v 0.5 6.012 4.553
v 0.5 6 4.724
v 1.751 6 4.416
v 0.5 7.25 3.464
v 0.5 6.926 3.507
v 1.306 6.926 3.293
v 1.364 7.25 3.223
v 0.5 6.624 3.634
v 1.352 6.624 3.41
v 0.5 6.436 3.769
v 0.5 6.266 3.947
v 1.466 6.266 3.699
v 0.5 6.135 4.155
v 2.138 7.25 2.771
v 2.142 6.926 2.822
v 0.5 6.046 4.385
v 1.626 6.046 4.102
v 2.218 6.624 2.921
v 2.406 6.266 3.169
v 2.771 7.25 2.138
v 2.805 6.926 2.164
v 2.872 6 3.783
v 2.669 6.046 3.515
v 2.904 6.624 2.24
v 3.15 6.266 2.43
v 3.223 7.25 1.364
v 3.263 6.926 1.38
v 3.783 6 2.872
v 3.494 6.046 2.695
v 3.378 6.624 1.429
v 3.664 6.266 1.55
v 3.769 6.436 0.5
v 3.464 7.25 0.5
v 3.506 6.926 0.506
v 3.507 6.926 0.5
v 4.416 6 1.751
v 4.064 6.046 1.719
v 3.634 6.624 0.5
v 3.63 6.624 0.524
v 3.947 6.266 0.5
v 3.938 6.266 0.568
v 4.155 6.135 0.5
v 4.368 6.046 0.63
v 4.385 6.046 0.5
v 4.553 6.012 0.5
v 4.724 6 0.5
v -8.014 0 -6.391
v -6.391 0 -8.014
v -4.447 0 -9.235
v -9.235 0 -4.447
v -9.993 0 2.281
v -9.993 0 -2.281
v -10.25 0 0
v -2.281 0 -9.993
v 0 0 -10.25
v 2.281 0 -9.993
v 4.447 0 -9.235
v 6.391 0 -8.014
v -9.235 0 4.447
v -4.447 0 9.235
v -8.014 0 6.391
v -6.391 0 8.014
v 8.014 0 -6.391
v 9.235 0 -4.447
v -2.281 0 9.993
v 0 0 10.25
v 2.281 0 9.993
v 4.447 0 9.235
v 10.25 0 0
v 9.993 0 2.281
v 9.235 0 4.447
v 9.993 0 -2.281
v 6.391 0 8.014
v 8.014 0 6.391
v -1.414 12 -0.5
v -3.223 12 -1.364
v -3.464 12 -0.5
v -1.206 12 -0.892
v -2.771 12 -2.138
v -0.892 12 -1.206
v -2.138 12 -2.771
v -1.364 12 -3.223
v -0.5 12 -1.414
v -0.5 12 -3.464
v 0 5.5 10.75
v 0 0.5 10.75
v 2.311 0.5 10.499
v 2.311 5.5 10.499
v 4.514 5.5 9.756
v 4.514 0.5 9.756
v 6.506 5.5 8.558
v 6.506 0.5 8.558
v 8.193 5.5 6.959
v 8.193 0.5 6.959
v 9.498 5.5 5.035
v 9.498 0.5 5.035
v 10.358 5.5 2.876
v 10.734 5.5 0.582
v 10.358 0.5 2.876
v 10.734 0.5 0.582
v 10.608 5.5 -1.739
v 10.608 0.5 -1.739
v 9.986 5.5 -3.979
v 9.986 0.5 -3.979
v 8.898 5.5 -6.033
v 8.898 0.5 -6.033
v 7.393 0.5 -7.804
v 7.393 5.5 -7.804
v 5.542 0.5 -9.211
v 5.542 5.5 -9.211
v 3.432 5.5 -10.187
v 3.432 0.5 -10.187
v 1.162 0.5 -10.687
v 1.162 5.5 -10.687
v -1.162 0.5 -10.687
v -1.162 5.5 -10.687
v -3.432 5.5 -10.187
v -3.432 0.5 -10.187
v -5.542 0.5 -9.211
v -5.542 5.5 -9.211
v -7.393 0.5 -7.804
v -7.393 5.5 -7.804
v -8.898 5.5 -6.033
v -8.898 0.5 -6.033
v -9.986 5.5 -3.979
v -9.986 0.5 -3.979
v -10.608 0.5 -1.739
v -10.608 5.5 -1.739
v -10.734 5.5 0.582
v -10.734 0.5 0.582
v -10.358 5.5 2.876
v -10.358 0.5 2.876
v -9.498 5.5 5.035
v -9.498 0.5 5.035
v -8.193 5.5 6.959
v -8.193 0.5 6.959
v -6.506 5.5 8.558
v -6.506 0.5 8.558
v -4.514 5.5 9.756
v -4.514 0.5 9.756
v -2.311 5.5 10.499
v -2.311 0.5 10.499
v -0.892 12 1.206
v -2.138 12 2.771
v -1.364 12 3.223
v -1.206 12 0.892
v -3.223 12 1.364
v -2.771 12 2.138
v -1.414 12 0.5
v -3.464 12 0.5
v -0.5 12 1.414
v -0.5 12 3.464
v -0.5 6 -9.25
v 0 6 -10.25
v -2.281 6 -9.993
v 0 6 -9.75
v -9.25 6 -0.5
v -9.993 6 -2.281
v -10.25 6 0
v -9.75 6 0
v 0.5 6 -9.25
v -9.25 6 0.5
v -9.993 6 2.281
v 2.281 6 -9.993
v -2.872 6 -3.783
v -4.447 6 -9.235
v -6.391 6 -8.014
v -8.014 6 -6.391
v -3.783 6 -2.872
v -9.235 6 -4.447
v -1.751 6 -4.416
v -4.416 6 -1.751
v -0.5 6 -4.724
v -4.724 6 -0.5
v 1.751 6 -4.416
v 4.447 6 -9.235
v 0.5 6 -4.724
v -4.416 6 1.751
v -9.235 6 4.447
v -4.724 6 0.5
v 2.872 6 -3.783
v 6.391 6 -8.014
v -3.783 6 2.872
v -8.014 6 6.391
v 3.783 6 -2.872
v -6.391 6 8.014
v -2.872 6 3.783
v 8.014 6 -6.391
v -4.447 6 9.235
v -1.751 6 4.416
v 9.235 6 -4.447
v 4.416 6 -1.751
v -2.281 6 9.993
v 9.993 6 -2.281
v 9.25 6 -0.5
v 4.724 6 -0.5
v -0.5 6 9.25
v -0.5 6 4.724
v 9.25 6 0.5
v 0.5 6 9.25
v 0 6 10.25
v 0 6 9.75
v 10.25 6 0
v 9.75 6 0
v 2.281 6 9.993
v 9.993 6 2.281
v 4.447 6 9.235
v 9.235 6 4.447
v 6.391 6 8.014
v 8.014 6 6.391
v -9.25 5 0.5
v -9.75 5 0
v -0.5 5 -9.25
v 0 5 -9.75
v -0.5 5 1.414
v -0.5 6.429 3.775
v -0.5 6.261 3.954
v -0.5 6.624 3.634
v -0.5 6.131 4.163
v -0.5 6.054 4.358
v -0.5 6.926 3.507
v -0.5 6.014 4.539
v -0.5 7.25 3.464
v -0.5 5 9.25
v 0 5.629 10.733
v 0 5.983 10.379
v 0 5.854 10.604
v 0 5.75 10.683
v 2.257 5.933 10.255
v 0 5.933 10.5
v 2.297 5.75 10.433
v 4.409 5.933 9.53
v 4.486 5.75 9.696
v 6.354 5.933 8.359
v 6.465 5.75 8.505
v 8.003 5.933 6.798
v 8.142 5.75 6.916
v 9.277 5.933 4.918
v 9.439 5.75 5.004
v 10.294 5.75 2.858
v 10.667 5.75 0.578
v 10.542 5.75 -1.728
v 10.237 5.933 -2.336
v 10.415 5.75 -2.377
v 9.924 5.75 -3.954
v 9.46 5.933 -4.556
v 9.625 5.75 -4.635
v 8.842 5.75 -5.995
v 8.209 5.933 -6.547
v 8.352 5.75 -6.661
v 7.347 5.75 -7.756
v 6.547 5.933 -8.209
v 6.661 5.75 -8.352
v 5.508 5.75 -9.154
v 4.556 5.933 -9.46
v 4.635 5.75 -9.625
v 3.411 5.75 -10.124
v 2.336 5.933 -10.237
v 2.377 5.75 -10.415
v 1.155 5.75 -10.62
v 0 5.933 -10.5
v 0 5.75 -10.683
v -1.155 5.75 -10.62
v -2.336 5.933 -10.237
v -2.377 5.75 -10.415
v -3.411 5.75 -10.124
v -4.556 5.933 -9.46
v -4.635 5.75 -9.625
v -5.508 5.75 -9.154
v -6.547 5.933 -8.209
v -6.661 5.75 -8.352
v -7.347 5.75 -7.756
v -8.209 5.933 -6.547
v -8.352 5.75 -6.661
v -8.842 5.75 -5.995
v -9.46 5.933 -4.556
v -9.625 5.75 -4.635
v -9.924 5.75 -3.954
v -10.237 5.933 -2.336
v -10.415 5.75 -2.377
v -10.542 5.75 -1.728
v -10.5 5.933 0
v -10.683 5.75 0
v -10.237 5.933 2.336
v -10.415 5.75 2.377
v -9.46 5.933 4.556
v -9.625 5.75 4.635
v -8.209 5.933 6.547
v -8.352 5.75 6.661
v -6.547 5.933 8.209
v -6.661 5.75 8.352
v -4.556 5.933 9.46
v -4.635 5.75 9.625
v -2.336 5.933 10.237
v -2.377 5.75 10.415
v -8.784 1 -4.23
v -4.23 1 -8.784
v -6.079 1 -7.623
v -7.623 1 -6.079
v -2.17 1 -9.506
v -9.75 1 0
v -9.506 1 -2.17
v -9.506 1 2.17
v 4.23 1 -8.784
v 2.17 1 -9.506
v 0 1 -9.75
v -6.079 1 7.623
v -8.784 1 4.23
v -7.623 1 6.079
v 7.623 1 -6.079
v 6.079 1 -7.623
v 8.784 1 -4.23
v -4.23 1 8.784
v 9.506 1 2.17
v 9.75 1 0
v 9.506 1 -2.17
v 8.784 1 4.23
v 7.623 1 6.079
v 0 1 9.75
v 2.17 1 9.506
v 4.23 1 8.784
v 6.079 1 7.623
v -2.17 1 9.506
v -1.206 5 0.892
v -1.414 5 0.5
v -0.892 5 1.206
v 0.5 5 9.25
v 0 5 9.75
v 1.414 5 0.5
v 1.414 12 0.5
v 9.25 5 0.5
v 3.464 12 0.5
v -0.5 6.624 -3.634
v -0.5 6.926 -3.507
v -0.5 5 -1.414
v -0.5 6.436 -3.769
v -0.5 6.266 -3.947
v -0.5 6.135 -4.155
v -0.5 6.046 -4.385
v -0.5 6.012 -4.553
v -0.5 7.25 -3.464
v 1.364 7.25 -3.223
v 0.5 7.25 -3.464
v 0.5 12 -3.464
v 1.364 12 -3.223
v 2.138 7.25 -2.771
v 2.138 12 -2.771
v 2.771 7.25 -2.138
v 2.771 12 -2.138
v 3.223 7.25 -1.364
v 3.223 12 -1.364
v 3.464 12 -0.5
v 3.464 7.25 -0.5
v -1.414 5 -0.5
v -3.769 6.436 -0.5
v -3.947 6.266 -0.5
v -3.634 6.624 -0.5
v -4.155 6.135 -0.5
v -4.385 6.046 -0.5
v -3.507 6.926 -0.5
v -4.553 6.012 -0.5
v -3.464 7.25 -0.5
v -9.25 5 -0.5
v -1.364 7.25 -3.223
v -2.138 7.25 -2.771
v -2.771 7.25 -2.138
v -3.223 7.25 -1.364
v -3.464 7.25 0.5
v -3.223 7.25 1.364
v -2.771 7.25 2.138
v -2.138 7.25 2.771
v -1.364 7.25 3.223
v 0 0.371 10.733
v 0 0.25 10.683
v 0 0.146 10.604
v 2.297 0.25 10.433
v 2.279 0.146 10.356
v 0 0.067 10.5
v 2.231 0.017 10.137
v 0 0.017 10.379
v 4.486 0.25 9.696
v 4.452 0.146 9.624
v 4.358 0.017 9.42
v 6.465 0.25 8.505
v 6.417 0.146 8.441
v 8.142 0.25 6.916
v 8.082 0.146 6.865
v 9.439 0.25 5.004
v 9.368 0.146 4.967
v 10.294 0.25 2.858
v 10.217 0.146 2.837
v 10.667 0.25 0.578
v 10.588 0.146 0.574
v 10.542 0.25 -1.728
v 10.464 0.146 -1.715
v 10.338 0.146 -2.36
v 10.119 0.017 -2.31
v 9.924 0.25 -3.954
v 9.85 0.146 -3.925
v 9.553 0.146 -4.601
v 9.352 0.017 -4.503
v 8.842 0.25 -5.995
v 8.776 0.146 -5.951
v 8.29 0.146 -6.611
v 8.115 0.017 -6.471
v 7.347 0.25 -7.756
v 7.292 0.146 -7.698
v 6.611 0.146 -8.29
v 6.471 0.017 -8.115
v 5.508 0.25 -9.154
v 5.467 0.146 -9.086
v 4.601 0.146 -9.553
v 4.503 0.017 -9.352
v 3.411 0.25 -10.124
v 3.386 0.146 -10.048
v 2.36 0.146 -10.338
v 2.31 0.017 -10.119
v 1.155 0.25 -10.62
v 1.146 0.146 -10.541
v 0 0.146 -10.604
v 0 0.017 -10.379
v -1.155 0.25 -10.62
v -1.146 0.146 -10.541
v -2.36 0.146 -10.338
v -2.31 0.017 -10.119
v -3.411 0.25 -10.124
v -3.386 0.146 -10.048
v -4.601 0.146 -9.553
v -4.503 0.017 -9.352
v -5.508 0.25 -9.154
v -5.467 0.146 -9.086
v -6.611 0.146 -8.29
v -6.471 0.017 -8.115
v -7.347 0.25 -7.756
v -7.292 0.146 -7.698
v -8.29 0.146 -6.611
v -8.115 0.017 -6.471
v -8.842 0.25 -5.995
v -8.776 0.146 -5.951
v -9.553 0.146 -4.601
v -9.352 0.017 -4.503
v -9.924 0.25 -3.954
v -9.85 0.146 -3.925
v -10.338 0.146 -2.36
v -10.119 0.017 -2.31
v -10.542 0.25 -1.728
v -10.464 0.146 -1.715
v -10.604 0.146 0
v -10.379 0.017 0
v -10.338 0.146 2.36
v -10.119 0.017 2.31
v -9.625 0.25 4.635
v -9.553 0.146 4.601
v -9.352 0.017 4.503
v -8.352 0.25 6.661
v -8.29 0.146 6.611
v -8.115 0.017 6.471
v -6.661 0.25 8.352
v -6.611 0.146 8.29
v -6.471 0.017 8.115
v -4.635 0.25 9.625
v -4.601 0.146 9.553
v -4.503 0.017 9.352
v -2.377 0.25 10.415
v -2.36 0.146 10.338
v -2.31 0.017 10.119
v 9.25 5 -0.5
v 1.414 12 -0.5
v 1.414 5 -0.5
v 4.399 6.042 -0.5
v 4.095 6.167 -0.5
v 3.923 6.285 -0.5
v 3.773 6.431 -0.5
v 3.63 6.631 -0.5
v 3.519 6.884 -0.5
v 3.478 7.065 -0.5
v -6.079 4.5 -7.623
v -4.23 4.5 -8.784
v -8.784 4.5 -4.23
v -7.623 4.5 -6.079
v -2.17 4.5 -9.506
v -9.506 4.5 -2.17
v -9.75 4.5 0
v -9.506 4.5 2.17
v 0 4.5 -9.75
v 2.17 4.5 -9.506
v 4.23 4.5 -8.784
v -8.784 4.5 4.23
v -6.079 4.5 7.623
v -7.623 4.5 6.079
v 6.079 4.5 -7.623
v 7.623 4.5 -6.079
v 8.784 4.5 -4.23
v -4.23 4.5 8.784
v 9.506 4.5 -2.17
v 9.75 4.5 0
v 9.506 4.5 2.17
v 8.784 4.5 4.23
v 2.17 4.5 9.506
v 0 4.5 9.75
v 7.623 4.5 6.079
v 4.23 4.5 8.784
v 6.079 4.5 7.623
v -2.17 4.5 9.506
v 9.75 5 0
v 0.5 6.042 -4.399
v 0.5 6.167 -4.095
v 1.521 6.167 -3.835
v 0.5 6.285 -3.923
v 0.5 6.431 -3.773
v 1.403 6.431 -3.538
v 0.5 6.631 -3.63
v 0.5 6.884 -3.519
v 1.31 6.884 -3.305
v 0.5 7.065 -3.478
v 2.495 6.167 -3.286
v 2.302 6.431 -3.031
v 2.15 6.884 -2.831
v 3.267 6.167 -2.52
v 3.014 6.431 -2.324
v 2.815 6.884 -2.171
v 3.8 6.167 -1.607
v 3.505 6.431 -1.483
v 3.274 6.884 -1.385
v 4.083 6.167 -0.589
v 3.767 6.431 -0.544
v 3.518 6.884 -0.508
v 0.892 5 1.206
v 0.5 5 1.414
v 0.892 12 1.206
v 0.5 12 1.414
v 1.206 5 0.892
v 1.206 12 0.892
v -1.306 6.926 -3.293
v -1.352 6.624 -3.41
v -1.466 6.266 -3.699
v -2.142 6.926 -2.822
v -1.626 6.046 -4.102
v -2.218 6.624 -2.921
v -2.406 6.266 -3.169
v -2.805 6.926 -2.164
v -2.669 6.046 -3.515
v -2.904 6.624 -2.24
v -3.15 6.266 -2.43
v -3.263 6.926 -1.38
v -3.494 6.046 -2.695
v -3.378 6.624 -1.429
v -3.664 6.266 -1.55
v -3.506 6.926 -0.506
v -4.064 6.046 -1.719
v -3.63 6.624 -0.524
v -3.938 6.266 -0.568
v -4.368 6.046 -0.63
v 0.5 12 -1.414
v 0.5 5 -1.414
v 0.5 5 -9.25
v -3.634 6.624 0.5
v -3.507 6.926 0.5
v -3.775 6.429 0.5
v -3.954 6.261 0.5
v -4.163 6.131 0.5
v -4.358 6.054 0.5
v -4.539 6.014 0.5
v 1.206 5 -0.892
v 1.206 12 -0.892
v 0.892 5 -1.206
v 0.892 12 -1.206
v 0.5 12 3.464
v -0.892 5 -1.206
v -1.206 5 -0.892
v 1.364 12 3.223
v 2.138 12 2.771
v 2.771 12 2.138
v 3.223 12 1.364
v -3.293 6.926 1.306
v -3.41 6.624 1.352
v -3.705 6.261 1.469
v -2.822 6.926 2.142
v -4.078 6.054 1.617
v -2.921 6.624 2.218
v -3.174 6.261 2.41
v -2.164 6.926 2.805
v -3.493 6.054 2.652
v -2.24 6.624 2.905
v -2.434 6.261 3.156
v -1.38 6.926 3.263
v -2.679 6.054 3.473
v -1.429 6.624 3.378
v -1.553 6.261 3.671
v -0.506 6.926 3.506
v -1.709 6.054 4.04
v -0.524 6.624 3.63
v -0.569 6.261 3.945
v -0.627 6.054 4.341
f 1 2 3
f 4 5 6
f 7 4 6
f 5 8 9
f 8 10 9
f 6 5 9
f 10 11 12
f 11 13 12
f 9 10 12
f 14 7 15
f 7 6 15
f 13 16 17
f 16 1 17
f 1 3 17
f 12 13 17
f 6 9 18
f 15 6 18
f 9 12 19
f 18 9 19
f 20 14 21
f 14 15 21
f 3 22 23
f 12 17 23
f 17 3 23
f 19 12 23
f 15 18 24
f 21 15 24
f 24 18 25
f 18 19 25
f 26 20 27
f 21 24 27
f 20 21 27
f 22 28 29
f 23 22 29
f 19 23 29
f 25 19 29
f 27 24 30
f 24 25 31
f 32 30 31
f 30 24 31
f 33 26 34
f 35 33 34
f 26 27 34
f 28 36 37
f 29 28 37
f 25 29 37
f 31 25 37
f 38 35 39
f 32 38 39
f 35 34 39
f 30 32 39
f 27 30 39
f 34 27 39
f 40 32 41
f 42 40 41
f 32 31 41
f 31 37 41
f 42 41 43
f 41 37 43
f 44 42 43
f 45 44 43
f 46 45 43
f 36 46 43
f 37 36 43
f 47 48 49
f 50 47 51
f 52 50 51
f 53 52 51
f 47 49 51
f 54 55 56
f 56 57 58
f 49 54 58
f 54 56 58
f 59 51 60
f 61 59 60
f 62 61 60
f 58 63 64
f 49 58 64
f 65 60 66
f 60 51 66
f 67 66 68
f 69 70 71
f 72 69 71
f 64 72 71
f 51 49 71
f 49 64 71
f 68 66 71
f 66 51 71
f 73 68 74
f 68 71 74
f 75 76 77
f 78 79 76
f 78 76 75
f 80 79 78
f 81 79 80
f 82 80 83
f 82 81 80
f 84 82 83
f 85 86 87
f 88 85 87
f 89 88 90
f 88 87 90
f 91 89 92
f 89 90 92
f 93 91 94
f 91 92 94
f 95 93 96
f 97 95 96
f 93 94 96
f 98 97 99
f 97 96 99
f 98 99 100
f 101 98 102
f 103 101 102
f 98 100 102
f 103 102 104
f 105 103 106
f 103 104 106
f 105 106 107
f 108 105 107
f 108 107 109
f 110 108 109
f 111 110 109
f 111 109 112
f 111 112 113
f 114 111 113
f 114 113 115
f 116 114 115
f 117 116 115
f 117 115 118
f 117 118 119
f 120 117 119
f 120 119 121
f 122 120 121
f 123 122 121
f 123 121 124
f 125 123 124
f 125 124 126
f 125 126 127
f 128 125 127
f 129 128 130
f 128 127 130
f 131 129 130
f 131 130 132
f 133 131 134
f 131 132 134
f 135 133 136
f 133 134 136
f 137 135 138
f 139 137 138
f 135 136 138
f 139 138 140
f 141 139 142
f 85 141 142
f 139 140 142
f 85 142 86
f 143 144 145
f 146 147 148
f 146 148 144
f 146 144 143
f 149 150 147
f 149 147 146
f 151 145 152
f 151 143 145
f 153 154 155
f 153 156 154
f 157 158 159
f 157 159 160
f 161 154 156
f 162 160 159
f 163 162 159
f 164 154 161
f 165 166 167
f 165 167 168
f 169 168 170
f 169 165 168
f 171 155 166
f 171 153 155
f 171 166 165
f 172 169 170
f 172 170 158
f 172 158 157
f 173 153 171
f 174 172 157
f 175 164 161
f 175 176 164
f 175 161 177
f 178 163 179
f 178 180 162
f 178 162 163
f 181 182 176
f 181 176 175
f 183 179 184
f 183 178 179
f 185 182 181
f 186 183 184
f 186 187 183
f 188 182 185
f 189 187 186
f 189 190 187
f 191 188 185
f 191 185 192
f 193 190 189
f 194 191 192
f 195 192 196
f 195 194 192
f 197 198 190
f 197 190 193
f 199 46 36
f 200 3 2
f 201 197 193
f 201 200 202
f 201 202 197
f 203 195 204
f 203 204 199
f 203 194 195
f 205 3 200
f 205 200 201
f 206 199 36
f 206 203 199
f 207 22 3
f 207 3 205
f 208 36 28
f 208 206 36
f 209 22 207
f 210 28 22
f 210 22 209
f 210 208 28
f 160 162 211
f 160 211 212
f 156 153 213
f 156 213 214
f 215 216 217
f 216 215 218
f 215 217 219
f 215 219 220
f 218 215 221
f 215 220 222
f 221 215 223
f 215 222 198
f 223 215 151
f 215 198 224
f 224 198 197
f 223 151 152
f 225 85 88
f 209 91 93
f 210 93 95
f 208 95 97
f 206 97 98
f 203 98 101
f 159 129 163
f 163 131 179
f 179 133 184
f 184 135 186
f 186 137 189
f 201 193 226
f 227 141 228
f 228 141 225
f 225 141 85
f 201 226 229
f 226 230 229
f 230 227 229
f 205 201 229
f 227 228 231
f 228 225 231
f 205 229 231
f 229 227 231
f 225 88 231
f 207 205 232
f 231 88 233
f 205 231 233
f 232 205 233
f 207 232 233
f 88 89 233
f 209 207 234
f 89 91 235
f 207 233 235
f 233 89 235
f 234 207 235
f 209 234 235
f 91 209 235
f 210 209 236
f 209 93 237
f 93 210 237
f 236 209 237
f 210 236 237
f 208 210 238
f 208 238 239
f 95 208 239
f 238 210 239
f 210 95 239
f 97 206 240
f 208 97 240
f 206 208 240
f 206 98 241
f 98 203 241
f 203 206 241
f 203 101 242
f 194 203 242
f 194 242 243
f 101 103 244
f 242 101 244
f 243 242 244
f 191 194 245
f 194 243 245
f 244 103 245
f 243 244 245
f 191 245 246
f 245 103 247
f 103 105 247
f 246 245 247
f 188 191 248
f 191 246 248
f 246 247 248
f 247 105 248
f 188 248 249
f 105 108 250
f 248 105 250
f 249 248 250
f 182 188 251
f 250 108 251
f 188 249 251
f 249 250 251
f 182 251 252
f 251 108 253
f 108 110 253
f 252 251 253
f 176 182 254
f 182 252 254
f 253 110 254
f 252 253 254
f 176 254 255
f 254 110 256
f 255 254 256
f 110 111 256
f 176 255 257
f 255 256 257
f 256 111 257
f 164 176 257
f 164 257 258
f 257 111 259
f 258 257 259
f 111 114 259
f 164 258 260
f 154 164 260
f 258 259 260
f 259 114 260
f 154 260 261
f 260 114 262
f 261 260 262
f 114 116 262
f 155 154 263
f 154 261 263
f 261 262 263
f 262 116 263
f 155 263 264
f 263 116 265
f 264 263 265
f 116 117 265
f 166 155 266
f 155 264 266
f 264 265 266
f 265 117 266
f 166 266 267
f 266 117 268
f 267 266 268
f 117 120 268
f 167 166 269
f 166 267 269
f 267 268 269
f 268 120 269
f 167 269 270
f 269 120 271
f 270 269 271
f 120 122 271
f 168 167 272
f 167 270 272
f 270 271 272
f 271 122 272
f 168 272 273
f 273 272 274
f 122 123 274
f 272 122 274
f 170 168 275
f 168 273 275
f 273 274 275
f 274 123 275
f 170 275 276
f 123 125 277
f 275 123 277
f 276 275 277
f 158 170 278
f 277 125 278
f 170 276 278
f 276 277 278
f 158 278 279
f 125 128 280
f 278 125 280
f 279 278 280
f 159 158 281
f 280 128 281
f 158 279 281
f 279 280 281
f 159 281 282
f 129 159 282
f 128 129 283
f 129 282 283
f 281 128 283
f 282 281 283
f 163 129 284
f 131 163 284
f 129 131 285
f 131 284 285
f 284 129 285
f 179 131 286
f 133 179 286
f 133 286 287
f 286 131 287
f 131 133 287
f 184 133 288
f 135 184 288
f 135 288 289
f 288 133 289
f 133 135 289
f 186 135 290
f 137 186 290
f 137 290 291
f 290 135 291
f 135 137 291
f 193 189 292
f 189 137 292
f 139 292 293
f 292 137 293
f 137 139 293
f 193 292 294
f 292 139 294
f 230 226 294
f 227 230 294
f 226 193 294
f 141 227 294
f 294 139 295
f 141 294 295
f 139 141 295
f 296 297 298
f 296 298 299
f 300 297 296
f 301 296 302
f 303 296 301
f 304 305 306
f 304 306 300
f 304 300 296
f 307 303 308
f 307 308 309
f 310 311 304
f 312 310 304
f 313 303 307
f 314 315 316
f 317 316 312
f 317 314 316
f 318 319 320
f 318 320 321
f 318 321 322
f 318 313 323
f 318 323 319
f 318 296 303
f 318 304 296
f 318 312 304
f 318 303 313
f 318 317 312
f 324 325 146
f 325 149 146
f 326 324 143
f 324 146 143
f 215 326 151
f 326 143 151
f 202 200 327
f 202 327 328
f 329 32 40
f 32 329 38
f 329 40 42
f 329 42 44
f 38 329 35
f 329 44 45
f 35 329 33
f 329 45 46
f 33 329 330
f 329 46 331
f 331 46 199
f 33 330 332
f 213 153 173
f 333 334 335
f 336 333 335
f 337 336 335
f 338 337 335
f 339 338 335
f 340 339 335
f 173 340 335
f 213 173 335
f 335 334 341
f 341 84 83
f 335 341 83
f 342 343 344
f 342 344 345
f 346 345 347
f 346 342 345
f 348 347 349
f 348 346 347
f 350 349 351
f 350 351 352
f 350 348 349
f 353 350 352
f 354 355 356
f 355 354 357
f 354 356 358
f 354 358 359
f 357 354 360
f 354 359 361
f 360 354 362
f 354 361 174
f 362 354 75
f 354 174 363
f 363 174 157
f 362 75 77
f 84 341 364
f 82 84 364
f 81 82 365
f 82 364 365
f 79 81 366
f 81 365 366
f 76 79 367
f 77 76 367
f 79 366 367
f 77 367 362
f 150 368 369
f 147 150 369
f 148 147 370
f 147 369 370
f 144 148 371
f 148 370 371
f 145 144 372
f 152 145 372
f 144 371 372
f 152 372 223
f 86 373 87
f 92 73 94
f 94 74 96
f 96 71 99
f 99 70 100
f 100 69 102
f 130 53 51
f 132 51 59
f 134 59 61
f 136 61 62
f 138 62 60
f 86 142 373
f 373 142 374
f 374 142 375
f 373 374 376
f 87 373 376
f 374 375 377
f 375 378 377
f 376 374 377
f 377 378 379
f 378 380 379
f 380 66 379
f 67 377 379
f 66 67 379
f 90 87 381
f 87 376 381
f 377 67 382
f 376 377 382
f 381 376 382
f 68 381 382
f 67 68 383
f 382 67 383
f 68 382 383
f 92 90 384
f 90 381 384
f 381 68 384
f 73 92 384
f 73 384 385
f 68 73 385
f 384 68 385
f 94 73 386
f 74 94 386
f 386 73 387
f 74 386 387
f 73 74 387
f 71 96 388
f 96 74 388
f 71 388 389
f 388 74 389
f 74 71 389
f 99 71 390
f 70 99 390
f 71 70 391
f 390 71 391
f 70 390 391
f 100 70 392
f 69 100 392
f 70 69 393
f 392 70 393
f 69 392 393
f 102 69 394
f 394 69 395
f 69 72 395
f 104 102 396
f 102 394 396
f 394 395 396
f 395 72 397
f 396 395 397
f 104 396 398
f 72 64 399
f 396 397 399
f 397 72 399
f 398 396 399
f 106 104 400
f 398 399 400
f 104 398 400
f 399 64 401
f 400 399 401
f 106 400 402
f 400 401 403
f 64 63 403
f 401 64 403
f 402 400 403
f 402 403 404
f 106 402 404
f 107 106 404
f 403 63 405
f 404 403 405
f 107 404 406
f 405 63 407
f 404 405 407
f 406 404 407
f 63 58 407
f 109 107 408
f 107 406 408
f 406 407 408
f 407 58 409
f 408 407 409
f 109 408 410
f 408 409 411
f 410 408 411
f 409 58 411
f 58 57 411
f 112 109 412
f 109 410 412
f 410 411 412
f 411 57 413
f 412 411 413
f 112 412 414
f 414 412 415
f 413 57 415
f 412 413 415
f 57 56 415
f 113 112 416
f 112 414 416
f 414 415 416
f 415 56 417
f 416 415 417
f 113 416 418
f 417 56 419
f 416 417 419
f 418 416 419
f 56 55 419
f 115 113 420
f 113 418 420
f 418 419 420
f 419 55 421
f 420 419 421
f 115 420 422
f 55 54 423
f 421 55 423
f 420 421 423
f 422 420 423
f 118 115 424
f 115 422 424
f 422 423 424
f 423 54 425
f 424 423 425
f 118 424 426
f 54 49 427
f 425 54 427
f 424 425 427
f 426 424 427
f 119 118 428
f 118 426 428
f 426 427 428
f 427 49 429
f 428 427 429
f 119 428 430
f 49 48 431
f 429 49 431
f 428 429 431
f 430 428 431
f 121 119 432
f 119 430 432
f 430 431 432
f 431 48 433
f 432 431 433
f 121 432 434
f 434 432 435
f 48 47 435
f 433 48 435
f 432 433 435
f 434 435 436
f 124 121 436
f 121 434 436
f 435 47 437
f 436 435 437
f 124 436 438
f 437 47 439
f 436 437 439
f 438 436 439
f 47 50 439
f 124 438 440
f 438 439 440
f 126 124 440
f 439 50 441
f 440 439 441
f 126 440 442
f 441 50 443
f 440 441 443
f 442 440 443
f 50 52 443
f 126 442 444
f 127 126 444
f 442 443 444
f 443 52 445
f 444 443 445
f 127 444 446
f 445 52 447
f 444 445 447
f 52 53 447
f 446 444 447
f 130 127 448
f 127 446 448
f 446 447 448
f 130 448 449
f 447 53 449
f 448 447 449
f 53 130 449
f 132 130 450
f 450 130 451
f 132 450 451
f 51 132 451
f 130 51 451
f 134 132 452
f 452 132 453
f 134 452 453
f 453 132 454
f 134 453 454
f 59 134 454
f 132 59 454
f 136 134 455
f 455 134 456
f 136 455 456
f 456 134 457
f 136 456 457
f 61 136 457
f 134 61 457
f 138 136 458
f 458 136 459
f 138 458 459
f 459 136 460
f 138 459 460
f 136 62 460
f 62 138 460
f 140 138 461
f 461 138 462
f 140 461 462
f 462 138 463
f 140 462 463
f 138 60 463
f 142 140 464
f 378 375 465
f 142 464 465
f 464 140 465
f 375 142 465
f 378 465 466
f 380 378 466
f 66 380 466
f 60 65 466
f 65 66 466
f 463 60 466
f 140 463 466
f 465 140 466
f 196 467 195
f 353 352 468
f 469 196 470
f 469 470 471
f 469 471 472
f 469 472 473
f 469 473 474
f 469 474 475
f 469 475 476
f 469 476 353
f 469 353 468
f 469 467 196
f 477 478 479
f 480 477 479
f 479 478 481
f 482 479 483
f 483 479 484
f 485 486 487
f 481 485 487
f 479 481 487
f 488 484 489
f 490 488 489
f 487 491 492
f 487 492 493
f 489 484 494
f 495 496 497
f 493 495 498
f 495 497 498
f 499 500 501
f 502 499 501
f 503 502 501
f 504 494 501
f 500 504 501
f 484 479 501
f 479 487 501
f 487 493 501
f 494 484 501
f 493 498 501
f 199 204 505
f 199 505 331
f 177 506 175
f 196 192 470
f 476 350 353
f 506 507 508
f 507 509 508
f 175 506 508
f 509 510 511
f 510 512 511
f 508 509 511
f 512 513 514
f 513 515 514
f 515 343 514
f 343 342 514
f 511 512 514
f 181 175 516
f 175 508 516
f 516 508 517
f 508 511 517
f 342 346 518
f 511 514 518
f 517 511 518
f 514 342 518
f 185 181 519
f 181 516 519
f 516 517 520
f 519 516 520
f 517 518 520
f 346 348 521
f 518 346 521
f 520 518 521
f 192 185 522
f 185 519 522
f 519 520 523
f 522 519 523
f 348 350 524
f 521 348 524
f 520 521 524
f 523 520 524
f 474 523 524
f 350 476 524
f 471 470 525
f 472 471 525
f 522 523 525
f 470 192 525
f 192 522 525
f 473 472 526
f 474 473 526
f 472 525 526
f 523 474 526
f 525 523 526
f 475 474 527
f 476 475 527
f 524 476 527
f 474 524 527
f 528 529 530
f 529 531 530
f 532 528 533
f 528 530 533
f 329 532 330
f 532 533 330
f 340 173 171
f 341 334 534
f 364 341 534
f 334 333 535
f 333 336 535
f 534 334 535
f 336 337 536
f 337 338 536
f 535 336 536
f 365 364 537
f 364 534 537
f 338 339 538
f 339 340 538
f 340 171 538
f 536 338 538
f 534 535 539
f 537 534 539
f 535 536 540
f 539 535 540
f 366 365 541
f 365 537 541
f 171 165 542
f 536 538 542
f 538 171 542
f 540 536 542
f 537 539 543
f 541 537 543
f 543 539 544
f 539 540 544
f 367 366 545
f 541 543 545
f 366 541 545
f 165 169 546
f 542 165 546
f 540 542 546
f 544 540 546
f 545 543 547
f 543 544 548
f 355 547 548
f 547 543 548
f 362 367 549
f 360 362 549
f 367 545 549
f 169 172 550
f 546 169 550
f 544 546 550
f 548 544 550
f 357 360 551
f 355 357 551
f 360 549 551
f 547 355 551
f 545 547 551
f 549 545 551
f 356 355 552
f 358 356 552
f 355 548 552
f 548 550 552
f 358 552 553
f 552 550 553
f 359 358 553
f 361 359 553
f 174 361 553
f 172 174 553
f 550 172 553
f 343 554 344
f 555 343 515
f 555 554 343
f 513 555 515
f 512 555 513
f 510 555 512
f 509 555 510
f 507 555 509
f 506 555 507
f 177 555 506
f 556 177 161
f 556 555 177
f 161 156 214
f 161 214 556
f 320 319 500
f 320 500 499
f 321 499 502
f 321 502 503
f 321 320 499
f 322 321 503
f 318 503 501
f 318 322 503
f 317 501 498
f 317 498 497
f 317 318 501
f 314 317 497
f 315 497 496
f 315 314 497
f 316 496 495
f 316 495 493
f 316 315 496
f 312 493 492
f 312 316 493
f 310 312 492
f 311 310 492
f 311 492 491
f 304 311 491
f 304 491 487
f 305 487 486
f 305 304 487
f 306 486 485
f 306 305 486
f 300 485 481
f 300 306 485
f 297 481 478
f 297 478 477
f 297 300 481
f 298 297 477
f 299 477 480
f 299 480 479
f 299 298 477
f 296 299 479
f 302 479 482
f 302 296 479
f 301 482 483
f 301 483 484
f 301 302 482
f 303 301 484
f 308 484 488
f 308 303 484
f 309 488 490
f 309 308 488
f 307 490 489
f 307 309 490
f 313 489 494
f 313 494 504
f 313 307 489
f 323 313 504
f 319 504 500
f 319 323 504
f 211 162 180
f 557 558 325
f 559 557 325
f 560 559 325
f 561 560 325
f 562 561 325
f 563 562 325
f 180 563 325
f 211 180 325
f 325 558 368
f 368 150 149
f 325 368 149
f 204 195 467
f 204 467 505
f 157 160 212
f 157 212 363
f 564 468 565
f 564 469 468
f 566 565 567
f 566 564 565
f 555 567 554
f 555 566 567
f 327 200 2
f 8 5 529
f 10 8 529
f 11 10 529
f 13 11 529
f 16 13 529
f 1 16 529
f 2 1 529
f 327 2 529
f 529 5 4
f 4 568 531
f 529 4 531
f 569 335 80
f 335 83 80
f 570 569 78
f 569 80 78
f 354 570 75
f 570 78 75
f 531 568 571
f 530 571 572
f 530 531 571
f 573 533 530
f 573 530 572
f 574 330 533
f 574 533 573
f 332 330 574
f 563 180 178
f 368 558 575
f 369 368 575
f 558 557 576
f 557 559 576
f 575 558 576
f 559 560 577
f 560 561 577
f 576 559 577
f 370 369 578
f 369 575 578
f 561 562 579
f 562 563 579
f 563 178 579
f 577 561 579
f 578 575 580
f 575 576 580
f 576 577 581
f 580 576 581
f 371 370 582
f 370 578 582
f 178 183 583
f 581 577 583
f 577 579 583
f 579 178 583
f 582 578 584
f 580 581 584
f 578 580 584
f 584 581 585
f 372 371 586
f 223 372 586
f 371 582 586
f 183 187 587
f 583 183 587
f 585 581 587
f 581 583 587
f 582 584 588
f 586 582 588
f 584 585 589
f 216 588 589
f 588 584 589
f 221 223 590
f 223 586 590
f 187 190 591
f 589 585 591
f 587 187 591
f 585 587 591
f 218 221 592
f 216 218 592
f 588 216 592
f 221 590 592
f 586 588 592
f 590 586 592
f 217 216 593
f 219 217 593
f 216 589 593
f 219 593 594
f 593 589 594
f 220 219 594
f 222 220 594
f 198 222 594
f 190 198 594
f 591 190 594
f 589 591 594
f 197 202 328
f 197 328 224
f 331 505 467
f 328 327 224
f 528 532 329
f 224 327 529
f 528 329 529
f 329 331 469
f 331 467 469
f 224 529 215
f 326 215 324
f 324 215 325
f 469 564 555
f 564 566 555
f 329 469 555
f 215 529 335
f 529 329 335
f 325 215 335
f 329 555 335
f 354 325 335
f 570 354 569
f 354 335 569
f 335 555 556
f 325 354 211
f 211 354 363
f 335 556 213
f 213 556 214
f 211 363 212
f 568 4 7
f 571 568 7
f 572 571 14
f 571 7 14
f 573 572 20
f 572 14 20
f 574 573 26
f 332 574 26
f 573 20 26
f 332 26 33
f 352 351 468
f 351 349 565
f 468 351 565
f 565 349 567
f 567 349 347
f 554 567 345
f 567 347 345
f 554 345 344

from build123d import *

# Parameters (mm, degrees)
SKETCH1_R           = 10.75
SKETCH1_R_2         = 9.75
BOSS_EXTRUDE1_DEPTH = 1
SKETCH2_R           = 10.75
SKETCH2_R_2         = 9.75
BOSS_EXTRUDE2_DEPTH = 3.5
SKETCH3_R           = 10.75
BOSS_EXTRUDE3_DEPTH = 1.5
CUT_EXTRUDE1_DEPTH  = 1
BOSS_EXTRUDE4_DEPTH = 6
FILLET1_R           = 1.25
FILLET2_R           = 0.5


with BuildPart() as part:
    # Sketch1 → Boss-Extrude1 (new body)
    with BuildSketch(Plane(origin=(0, 0, 0), x_dir=(1, 0, 0), z_dir=(0, 1, 0))):
        with Locations(Location((0, 0, 0), (0, 0, 270))):
            Circle(SKETCH1_R)
        Circle(SKETCH1_R_2, mode=Mode.SUBTRACT)
        Circle(SKETCH1_R_2)
    extrude(amount=BOSS_EXTRUDE1_DEPTH)

    # Sketch2 → Boss-Extrude2 (add)
    with BuildSketch(Plane(origin=(0, 1, 0), x_dir=(1, 0, 0), z_dir=(0, 1, 0))):
        with Locations(Location((0, 0, 0), (0, 0, 270))):
            Circle(SKETCH2_R)
        with Locations(Location((0, 0, 0), (0, 0, 270))):
            Circle(SKETCH2_R_2, mode=Mode.SUBTRACT)
    extrude(amount=BOSS_EXTRUDE2_DEPTH)

    # Sketch3 → Boss-Extrude3 (add)
    with BuildSketch(Plane(origin=(0, 4.5, 0), x_dir=(1, 0, 0), z_dir=(0, 1, 0))):
        with Locations(Location((0, 0, 0), (0, 0, 270))):
            Circle(SKETCH3_R)
    extrude(amount=BOSS_EXTRUDE3_DEPTH)

    # Sketch4 → Cut-Extrude1 (cut)
    with BuildSketch(Plane(origin=(0, 6, 0), x_dir=(1, 0, 0), z_dir=(0, 1, 0))):
        Polygon((-9.25, -0.5), (-9.75, 0), (-9.25, 0.5), (-0.5, 0.5), (-0.5, 9.25), (0, 9.75), (0.5, 9.25), (0.5, 0.5), (9.25, 0.5), (9.75, 0), (9.25, -0.5), (0.5, -0.5), (0.5, -9.25), (0, -9.75), (-0.5, -9.25), (-0.5, -0.5), align=None)
        with BuildLine():
            ThreePointArc((-1.414213562, -0.5), (-1.5, 0), (-1.414213562, 0.5))
            Line((-1.414213562, 0.5), (-9.25, 0.5))
            Line((-9.25, 0.5), (-9.75, 0))
            Line((-9.75, 0), (-9.25, -0.5))
            Line((-9.25, -0.5), (-1.414213562, -0.5))
        make_face()
        with BuildLine():
            Line((9.25, 0.5), (1.414213562, 0.5))
            ThreePointArc((1.414213562, 0.5), (1.478397839, 0.253652968), (1.5, 0))
            ThreePointArc((1.5, 0), (1.478397839, -0.253652968), (1.414213562, -0.5))
            Line((1.414213562, -0.5), (9.25, -0.5))
            Line((9.25, -0.5), (9.75, 0))
            Line((9.75, 0), (9.25, 0.5))
        make_face()
        with BuildLine():
            Line((-0.5, 9.25), (-0.5, 1.414213562))
            ThreePointArc((-0.5, 1.414213562), (0, 1.5), (0.5, 1.414213562))
            Line((0.5, 1.414213562), (0.5, 9.25))
            Line((0.5, 9.25), (0, 9.75))
            Line((0, 9.75), (-0.5, 9.25))
        make_face()
        with BuildLine():
            ThreePointArc((0.5, -1.414213562), (0, -1.5), (-0.5, -1.414213562))
            Line((-0.5, -1.414213562), (-0.5, -9.25))
            Line((-0.5, -9.25), (0, -9.75))
            Line((0, -9.75), (0.5, -9.25))
            Line((0.5, -9.25), (0.5, -1.414213562))
        make_face()
        with BuildLine():
            Line((-0.5, -0.5), (-1.414213562, -0.5))
            ThreePointArc((-1.414213562, -0.5), (-1.060660172, -1.060660172), (-0.5, -1.414213562))
            Line((-0.5, -1.414213562), (-0.5, -0.5))
        make_face()
        with BuildLine():
            Line((-1.414213562, 0.5), (-0.5, 0.5))
            Line((-0.5, 0.5), (-0.5, 1.414213562))
            ThreePointArc((-0.5, 1.414213562), (-1.060660172, 1.060660172), (-1.414213562, 0.5))
        make_face()
        with BuildLine():
            ThreePointArc((1.414213562, 0.5), (1.060660172, 1.060660172), (0.5, 1.414213562))
            Line((0.5, 1.414213562), (0.5, 0.5))
            Line((0.5, 0.5), (1.414213562, 0.5))
        make_face()
        with BuildLine():
            Line((0.5, -0.5), (0.5, -1.414213562))
            ThreePointArc((0.5, -1.414213562), (1.060660172, -1.060660172), (1.414213562, -0.5))
            Line((1.414213562, -0.5), (0.5, -0.5))
        make_face()
    extrude(amount=-CUT_EXTRUDE1_DEPTH, mode=Mode.SUBTRACT)

    # Sketch6 → Boss-Extrude4 (add)
    with BuildSketch(Plane(origin=(0, 6, 0), x_dir=(1, 0, 0), z_dir=(0, 1, 0))):
        with BuildLine():
            Line((0.5, 1.414213562), (0.5, 3.464101615))
            ThreePointArc((0.5, 3.464101615), (2.474873734, 2.474873734), (3.464101615, 0.5))
            Line((3.464101615, 0.5), (1.414213562, 0.5))
            ThreePointArc((1.414213562, 0.5), (1.060660172, 1.060660172), (0.5, 1.414213562))
        make_face()
        with BuildLine():
            Line((0.5, -1.414213562), (0.5, -3.464101615))
            ThreePointArc((0.5, -3.464101615), (2.474873734, -2.474873734), (3.464101615, -0.5))
            Line((3.464101615, -0.5), (1.414213562, -0.5))
            ThreePointArc((1.414213562, -0.5), (1.060660172, -1.060660172), (0.5, -1.414213562))
        make_face()
        with BuildLine():
            Line((-1.414213562, -0.5), (-3.464101615, -0.5))
            ThreePointArc((-3.464101615, -0.5), (-2.474873734, -2.474873734), (-0.5, -3.464101615))
            Line((-0.5, -3.464101615), (-0.5, -1.414213562))
            ThreePointArc((-0.5, -1.414213562), (-1.060660172, -1.060660172), (-1.414213562, -0.5))
        make_face()
        with BuildLine():
            Line((-0.5, 1.414213562), (-0.5, 3.464101615))
            ThreePointArc((-0.5, 3.464101615), (-2.474873734, 2.474873734), (-3.464101615, 0.5))
            Line((-3.464101615, 0.5), (-1.414213562, 0.5))
            ThreePointArc((-1.414213562, 0.5), (-1.060660172, 1.060660172), (-0.5, 1.414213562))
        make_face()
    extrude(amount=BOSS_EXTRUDE4_DEPTH)

    # Fillet1
    fillet1_edges = [part.edges().sort_by_distance(p)[0] for p in [
        (-2.474873734, 6, 2.474873734),
        (-2.474873734, 6, -2.474873734),
        (2.474873734, 6, -2.474873734),
        (2.474873734, 6, 2.474873734),
    ]]
    fillet(fillet1_edges, radius=FILLET1_R)

    # Fillet2
    fillet2_edges = [part.edges().sort_by_distance(p)[0] for p in [
        (0, 6, -10.75),
        (0, 0, -10.75),
    ]]
    fillet(fillet2_edges, radius=FILLET2_R)


solid = part.part
